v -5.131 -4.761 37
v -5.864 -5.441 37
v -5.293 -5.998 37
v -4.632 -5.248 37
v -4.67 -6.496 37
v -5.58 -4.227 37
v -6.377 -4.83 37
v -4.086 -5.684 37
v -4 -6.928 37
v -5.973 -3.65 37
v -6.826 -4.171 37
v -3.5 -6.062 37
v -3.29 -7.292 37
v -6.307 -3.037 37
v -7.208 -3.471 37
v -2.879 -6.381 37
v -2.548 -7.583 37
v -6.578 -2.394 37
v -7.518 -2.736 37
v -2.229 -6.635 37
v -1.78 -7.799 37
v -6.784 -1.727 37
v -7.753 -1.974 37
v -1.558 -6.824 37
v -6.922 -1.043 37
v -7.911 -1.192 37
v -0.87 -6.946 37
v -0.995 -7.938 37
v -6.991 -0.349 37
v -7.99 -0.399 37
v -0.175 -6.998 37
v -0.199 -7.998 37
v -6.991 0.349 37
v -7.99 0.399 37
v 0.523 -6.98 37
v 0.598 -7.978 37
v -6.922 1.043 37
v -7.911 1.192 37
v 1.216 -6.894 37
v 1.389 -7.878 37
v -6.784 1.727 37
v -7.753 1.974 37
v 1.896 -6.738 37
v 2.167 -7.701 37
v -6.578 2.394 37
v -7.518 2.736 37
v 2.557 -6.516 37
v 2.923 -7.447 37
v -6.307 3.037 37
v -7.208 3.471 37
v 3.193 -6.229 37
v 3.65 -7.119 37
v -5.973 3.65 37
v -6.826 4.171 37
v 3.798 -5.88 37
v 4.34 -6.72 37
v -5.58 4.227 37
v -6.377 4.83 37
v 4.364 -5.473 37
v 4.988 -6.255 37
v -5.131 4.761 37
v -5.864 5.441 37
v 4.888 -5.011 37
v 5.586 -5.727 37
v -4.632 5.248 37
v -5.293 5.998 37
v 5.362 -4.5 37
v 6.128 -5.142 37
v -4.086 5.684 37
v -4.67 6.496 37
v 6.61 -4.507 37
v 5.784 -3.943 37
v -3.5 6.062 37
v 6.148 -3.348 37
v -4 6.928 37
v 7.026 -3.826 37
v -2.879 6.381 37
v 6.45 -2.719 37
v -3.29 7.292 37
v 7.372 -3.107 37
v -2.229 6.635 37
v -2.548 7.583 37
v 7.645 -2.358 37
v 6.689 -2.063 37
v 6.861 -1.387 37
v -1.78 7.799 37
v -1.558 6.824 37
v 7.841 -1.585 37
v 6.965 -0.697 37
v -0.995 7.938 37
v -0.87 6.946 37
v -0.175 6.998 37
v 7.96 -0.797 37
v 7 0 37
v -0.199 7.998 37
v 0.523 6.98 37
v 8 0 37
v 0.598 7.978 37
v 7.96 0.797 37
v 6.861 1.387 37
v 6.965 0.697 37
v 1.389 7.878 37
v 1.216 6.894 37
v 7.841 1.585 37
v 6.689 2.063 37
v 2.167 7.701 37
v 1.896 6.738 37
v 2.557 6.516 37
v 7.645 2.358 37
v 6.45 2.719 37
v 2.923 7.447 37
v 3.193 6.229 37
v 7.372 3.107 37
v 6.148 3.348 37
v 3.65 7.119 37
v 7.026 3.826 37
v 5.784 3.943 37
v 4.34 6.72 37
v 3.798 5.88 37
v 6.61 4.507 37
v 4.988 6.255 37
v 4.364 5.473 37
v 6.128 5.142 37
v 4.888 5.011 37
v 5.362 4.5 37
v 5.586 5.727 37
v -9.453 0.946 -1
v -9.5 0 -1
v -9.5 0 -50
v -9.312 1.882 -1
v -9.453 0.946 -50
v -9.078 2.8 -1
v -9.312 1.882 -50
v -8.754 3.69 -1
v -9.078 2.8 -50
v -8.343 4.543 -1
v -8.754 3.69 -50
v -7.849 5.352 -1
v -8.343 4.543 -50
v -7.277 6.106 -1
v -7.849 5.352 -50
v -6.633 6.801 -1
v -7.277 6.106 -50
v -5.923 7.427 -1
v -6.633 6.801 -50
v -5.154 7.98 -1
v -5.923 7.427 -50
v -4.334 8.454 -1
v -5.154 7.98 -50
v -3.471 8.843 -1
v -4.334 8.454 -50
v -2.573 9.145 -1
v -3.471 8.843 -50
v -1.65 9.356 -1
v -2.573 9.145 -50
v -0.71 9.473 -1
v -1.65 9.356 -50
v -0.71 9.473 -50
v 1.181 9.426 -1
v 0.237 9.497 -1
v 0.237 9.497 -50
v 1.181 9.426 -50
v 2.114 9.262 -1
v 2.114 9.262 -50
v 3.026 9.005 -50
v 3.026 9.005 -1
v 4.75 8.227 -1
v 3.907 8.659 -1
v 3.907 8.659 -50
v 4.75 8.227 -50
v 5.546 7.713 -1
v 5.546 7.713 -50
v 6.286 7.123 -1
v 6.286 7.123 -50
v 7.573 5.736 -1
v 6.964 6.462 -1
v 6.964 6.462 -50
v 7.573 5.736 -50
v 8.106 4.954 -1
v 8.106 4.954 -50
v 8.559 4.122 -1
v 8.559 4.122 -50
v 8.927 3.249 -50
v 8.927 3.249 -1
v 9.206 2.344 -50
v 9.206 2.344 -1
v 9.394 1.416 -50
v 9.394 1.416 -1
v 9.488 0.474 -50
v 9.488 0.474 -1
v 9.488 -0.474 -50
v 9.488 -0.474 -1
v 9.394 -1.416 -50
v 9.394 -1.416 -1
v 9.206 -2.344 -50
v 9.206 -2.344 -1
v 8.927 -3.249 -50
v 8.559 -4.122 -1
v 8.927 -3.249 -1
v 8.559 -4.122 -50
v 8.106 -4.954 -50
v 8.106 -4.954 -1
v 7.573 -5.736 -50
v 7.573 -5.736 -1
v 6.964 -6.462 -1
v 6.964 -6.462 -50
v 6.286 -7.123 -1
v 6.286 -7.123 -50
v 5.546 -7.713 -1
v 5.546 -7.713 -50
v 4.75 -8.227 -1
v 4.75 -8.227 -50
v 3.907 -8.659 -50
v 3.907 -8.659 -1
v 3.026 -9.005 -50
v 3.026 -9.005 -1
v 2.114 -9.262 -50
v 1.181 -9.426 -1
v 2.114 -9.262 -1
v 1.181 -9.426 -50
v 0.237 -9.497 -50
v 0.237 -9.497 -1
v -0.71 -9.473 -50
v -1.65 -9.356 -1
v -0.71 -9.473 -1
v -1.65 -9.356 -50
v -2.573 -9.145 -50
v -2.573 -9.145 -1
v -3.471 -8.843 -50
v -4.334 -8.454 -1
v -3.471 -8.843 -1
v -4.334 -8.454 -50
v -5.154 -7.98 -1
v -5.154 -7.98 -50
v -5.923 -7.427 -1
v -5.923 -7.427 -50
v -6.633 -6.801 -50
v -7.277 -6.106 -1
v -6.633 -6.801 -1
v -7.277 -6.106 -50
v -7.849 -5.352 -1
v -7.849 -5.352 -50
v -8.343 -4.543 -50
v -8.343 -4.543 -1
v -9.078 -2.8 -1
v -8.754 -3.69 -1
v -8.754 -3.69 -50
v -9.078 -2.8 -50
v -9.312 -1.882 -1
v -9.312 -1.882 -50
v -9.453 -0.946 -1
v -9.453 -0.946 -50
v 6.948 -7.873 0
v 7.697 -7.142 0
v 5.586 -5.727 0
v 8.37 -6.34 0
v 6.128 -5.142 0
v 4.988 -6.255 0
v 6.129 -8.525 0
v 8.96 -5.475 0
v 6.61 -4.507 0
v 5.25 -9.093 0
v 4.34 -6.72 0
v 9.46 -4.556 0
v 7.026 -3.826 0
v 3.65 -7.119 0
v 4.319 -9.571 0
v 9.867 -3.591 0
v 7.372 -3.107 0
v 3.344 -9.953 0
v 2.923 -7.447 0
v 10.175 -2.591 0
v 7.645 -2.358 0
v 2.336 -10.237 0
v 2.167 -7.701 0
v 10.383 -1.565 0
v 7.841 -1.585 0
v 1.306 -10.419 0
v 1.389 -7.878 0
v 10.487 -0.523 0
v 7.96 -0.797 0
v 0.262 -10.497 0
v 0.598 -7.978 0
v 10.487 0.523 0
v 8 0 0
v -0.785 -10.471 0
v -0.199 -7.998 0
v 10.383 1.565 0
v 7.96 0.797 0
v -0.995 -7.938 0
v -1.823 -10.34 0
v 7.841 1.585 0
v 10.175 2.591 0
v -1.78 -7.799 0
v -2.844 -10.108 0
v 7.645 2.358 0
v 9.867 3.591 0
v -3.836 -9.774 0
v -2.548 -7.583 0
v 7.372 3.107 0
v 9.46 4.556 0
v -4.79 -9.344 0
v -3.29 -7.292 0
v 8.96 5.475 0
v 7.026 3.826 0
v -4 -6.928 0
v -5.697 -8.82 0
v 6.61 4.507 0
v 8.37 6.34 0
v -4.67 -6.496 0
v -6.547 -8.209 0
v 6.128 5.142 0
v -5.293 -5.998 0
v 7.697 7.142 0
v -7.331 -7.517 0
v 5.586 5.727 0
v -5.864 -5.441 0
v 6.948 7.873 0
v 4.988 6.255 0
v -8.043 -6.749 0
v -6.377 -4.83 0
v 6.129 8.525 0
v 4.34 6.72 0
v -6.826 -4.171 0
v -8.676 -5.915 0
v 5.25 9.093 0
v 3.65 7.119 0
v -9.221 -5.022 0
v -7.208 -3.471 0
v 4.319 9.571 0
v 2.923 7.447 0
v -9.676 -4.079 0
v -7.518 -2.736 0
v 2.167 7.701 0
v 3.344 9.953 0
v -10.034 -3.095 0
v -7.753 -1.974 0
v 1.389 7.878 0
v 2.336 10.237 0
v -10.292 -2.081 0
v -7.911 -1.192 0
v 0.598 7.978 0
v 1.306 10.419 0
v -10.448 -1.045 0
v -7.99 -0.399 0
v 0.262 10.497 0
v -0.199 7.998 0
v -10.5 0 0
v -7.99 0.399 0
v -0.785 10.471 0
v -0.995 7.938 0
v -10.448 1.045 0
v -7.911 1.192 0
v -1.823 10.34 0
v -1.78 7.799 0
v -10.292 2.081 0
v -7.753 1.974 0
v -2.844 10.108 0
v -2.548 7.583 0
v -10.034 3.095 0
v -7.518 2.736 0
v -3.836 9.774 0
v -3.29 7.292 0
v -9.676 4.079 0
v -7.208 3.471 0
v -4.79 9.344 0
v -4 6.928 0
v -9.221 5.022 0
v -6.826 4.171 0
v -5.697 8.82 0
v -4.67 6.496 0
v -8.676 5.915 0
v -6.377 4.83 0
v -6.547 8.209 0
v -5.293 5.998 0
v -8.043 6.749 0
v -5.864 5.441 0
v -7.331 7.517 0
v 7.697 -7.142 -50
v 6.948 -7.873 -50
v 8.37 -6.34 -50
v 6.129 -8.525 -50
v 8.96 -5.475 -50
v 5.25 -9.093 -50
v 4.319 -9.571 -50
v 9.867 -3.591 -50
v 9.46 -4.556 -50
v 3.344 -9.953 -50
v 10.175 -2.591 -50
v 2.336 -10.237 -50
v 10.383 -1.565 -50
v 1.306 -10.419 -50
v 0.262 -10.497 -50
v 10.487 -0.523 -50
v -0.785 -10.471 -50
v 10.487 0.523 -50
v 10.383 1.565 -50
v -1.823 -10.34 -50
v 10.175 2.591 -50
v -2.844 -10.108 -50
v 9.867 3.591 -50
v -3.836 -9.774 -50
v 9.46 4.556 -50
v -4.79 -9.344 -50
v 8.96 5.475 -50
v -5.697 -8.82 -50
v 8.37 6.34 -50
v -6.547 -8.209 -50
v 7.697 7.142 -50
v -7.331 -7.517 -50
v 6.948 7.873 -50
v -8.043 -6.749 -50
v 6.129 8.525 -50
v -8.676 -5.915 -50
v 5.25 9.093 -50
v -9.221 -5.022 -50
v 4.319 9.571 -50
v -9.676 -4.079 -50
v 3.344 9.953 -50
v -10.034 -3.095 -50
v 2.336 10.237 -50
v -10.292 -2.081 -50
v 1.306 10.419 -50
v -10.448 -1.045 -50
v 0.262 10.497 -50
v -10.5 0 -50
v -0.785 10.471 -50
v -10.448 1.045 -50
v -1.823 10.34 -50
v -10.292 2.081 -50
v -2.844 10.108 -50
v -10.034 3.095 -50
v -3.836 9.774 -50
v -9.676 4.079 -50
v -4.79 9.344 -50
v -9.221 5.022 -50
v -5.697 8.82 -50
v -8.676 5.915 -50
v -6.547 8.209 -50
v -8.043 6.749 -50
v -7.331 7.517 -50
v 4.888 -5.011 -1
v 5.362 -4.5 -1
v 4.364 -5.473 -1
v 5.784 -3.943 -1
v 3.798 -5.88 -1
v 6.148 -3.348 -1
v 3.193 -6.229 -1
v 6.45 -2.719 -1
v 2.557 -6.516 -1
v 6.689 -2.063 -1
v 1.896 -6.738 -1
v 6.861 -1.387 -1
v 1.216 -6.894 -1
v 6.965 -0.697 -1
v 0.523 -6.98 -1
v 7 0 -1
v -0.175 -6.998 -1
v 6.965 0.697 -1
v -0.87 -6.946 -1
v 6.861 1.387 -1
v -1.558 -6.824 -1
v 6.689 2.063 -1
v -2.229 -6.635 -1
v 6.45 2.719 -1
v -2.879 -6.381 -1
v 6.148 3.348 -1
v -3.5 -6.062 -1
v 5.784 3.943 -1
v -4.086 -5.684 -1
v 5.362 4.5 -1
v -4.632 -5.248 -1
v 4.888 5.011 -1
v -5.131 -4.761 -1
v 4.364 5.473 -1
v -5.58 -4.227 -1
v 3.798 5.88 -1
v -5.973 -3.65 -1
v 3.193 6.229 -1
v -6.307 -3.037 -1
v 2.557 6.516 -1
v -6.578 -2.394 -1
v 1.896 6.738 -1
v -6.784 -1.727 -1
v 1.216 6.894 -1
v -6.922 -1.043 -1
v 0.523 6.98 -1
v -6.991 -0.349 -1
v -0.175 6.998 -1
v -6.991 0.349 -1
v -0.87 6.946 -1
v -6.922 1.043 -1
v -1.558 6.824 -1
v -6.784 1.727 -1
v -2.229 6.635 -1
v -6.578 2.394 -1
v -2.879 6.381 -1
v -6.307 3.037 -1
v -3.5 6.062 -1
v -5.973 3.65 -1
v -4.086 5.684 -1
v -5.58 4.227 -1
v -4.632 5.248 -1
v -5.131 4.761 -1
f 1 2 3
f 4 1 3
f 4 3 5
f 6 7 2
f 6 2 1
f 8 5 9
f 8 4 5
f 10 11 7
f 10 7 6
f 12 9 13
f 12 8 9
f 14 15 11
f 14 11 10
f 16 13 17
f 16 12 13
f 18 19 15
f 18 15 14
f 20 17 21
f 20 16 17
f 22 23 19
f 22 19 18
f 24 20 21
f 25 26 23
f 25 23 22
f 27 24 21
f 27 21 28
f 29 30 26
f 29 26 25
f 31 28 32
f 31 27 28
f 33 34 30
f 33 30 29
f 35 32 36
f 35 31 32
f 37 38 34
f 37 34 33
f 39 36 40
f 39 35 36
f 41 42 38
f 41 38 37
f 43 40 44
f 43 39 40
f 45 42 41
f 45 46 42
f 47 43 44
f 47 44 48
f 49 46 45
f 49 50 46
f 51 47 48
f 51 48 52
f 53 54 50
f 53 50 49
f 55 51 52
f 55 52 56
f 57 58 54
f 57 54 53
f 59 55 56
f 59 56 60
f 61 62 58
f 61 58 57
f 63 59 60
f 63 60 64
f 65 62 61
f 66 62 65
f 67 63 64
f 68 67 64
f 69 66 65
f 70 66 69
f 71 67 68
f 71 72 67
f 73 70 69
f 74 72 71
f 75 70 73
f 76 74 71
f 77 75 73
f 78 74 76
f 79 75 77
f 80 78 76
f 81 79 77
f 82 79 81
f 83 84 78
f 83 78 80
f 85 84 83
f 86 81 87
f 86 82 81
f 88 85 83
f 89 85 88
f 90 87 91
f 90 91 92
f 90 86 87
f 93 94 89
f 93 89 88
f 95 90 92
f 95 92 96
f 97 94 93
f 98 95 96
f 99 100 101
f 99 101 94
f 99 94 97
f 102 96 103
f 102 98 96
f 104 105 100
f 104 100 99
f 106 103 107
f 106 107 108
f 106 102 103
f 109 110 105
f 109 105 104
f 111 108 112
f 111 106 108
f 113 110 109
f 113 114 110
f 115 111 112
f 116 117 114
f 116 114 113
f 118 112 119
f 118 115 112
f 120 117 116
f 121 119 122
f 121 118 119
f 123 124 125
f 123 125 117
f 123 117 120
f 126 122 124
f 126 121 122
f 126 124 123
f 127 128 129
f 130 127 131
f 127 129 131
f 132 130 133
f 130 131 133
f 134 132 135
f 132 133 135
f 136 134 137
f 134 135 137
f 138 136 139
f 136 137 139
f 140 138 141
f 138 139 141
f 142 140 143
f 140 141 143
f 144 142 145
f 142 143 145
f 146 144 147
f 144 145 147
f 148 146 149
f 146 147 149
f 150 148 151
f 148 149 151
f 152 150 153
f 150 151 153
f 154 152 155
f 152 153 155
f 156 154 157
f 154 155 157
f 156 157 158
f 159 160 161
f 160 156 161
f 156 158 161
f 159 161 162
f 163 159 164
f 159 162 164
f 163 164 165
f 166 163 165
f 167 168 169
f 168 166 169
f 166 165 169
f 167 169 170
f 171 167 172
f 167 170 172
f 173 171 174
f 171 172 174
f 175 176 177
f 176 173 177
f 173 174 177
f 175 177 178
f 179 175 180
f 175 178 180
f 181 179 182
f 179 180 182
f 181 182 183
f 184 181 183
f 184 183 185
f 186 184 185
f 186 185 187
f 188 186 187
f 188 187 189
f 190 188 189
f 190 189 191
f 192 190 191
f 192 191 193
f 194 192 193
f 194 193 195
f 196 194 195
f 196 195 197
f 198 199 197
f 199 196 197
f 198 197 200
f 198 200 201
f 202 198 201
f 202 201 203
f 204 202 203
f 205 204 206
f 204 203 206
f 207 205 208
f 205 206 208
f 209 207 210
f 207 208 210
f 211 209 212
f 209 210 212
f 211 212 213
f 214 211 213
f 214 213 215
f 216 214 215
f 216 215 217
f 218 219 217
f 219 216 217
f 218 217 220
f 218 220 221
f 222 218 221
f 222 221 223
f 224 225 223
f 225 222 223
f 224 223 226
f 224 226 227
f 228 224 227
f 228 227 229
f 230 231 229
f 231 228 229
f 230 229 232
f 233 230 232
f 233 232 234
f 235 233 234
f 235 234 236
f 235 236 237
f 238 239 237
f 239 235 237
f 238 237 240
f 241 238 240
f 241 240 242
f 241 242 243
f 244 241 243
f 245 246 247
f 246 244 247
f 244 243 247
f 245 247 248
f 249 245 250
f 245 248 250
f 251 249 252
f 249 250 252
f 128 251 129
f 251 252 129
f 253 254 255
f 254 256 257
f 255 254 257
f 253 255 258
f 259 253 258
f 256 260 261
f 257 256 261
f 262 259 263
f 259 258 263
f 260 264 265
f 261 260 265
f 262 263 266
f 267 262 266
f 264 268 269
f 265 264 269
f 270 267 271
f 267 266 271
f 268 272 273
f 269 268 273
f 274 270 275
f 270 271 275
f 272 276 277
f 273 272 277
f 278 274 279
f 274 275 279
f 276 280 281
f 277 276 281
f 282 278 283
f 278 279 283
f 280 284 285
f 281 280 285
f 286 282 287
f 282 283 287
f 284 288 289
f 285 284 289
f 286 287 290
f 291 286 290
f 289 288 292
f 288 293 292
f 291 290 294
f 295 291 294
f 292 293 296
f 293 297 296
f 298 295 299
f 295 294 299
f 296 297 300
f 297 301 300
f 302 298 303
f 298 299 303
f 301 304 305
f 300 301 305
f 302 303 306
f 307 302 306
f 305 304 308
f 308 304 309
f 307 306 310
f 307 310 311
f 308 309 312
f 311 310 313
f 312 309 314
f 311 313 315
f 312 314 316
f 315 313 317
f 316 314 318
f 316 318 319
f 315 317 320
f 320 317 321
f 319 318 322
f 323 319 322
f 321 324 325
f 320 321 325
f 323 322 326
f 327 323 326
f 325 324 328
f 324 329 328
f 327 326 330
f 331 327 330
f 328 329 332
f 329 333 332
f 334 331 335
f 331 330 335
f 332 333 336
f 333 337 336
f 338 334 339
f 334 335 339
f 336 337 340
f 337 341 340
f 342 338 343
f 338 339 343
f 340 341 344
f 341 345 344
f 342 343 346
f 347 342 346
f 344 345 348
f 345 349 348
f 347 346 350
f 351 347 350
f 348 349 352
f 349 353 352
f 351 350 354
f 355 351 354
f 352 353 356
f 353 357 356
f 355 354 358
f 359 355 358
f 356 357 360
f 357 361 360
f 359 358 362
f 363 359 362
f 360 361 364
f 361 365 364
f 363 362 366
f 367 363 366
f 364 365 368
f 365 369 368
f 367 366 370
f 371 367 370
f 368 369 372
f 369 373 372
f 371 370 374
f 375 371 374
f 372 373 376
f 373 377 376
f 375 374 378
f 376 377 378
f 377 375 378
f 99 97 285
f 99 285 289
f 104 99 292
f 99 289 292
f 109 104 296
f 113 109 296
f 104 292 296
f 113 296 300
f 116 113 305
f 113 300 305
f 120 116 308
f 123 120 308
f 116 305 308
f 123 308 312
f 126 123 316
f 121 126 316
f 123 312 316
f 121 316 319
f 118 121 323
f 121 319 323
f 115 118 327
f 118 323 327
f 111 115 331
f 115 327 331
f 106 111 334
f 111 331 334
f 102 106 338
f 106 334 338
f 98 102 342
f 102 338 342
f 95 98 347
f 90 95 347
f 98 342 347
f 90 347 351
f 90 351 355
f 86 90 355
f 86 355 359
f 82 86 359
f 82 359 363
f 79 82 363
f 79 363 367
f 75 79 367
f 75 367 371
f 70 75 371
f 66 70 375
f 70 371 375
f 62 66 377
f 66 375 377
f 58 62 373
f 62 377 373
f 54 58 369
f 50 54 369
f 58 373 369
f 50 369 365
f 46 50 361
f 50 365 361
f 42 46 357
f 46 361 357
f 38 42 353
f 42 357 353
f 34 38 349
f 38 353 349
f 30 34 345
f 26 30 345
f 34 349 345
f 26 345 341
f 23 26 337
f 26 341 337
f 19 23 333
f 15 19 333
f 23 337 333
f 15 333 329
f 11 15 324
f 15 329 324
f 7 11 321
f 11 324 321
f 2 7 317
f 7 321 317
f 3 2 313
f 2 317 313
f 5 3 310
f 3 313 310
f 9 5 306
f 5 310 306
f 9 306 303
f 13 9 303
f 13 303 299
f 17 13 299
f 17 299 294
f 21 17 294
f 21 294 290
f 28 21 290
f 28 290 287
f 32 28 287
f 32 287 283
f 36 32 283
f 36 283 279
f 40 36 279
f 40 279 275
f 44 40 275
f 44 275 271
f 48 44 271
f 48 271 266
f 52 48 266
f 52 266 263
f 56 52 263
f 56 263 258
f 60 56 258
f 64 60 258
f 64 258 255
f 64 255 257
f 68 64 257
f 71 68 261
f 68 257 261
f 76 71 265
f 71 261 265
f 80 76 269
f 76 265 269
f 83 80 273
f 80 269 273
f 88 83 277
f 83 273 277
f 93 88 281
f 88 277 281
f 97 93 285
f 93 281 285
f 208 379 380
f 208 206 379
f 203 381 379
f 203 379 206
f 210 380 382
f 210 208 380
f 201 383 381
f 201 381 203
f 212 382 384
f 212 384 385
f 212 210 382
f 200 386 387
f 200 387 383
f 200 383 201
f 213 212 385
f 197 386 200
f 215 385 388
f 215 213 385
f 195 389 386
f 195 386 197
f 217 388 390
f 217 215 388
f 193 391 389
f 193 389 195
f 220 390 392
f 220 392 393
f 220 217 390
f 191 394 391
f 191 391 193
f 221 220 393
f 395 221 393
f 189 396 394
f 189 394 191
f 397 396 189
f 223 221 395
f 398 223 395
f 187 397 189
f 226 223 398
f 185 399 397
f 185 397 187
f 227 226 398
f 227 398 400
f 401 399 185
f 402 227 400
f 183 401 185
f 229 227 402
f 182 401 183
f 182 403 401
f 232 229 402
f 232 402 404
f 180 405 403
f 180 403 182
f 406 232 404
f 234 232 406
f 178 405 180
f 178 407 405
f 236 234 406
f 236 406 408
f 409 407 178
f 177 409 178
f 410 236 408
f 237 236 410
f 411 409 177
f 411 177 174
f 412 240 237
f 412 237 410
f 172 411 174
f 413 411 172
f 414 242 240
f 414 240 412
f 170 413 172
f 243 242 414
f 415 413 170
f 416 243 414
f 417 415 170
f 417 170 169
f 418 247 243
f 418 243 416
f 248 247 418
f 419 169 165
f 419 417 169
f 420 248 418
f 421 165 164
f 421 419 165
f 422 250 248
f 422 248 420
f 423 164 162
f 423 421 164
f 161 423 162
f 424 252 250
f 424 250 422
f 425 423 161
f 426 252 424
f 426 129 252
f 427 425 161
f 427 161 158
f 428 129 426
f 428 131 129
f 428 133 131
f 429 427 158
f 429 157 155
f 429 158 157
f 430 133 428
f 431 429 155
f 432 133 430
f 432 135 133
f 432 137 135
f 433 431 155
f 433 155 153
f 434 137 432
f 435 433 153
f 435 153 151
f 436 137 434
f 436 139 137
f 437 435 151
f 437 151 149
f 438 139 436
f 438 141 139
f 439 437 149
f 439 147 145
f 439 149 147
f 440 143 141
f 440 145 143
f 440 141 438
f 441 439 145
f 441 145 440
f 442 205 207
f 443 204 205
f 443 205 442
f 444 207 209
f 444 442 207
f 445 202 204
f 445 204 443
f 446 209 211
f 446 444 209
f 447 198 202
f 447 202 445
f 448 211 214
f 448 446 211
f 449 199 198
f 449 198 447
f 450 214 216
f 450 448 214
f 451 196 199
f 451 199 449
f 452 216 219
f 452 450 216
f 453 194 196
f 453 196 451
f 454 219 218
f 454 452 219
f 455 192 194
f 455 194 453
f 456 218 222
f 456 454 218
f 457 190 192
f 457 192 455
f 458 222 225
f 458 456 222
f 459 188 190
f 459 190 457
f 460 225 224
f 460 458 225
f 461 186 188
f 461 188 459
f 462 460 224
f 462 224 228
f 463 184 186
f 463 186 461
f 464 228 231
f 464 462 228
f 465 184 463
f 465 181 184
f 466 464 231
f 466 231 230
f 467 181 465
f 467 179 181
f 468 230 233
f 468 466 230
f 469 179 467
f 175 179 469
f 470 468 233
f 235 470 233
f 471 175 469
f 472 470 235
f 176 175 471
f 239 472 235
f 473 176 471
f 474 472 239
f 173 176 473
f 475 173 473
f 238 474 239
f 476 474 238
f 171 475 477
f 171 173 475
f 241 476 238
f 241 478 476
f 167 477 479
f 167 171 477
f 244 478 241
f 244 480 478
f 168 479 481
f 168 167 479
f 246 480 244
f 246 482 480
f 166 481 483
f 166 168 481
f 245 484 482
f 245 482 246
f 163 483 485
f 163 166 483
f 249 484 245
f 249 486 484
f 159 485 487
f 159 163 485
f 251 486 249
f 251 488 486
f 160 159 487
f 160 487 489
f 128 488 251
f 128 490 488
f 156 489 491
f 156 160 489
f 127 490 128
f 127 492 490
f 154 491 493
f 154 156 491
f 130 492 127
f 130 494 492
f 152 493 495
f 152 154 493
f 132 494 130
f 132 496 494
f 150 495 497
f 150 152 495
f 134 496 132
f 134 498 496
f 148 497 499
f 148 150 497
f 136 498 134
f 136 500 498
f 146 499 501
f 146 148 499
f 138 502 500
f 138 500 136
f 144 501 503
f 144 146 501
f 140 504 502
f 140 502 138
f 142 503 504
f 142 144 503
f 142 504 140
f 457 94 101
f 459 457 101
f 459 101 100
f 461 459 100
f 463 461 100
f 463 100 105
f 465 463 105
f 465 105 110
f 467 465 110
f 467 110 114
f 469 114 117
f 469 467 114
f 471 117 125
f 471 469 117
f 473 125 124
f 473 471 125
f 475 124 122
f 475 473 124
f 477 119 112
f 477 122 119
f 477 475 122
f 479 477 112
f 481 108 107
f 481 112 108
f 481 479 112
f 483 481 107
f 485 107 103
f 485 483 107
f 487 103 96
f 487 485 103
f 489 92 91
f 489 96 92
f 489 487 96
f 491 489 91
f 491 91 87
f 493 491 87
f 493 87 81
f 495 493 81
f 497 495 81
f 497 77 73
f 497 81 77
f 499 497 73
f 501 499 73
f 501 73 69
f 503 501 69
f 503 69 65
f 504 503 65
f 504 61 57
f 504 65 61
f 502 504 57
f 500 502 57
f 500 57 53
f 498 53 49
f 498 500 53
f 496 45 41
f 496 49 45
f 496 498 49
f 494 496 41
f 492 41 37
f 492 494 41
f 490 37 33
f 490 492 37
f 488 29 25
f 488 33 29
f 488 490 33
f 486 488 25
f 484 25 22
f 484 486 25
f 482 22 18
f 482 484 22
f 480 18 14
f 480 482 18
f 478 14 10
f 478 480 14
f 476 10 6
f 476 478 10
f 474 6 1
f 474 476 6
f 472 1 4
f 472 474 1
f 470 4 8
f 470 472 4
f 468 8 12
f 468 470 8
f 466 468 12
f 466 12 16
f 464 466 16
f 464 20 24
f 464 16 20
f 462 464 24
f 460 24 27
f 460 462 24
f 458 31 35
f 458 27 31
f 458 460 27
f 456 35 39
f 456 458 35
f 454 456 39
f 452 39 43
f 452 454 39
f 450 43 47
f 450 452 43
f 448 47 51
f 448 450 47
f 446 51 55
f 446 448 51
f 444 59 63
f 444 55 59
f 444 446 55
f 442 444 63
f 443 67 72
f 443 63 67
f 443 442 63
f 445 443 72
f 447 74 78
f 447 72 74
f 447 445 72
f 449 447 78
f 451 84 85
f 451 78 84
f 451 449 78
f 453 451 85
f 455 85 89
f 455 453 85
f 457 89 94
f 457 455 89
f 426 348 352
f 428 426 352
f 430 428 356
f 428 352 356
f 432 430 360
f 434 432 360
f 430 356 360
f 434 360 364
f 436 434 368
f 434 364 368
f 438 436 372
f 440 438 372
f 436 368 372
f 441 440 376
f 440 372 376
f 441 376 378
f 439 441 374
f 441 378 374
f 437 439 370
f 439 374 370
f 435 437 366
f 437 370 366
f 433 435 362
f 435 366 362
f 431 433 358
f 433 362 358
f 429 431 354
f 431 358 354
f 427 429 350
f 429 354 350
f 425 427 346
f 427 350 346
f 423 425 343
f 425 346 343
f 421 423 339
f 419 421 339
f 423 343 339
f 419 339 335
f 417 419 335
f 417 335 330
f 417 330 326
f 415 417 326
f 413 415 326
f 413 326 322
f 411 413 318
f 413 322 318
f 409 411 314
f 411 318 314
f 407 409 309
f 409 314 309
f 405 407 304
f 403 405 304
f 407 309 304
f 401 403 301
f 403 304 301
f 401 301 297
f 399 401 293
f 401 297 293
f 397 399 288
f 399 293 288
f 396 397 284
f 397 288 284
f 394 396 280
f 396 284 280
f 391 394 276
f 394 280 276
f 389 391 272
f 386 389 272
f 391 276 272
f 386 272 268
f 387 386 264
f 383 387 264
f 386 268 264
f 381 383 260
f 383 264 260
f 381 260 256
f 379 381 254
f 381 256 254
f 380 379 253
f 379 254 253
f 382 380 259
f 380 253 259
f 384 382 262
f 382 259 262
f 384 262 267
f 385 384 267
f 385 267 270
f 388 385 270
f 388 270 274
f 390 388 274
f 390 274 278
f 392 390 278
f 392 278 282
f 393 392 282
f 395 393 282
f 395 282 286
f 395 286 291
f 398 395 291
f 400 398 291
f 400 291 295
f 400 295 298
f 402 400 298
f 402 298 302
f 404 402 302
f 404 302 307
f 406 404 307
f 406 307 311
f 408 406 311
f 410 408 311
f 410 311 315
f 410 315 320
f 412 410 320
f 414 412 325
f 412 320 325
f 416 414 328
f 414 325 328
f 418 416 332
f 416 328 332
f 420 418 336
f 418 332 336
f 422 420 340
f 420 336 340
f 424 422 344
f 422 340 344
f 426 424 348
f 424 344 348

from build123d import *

# Parameters (mm, degrees)
SKETCH1_R           = 8
BOSS_EXTRUDE2_DEPTH = 37
SKETCH4_R           = 10.5
BOSS_EXTRUDE4_DEPTH = 50
SHELL1_T            = -1
CUT_EXTRUDE2_REACH  = 90.258
SKETCH5_R           = 9.5


with BuildPart() as part:
    # Sketch1 → Boss-Extrude2 (new body)
    with BuildSketch(Plane.XY):
        Circle(SKETCH1_R)
    extrude(amount=BOSS_EXTRUDE2_DEPTH)

    # Sketch4 → Boss-Extrude4 (add)
    with BuildSketch(Plane(origin=(0, 0, 0), x_dir=(-1, 0, 0), z_dir=(0, 0, -1))):
        Circle(SKETCH4_R)
    extrude(amount=BOSS_EXTRUDE4_DEPTH)

    # Shell1
    shell1_openings = [part.faces().sort_by_distance(p)[0] for p in [
        (0, 0, 37),
    ]]
    offset(amount=SHELL1_T, openings=shell1_openings, kind=Kind.INTERSECTION)

    # Sketch5 → Cut-Extrude2 (cut, up to next)
    with BuildSketch(Plane(origin=(0, 0, -50), x_dir=(-1, 0, 0), z_dir=(0, 0, -1)), mode=Mode.PRIVATE) as cut_extrude2_sk1:
        Circle(SKETCH5_R)
    cut_extrude2_tool1 = extrude(cut_extrude2_sk1.sketch, amount=-CUT_EXTRUDE2_REACH, mode=Mode.PRIVATE) & part.part
    add(cut_extrude2_tool1.solids().sort_by_distance((0, 0, -50))[0], mode=Mode.SUBTRACT)


solid = part.part
